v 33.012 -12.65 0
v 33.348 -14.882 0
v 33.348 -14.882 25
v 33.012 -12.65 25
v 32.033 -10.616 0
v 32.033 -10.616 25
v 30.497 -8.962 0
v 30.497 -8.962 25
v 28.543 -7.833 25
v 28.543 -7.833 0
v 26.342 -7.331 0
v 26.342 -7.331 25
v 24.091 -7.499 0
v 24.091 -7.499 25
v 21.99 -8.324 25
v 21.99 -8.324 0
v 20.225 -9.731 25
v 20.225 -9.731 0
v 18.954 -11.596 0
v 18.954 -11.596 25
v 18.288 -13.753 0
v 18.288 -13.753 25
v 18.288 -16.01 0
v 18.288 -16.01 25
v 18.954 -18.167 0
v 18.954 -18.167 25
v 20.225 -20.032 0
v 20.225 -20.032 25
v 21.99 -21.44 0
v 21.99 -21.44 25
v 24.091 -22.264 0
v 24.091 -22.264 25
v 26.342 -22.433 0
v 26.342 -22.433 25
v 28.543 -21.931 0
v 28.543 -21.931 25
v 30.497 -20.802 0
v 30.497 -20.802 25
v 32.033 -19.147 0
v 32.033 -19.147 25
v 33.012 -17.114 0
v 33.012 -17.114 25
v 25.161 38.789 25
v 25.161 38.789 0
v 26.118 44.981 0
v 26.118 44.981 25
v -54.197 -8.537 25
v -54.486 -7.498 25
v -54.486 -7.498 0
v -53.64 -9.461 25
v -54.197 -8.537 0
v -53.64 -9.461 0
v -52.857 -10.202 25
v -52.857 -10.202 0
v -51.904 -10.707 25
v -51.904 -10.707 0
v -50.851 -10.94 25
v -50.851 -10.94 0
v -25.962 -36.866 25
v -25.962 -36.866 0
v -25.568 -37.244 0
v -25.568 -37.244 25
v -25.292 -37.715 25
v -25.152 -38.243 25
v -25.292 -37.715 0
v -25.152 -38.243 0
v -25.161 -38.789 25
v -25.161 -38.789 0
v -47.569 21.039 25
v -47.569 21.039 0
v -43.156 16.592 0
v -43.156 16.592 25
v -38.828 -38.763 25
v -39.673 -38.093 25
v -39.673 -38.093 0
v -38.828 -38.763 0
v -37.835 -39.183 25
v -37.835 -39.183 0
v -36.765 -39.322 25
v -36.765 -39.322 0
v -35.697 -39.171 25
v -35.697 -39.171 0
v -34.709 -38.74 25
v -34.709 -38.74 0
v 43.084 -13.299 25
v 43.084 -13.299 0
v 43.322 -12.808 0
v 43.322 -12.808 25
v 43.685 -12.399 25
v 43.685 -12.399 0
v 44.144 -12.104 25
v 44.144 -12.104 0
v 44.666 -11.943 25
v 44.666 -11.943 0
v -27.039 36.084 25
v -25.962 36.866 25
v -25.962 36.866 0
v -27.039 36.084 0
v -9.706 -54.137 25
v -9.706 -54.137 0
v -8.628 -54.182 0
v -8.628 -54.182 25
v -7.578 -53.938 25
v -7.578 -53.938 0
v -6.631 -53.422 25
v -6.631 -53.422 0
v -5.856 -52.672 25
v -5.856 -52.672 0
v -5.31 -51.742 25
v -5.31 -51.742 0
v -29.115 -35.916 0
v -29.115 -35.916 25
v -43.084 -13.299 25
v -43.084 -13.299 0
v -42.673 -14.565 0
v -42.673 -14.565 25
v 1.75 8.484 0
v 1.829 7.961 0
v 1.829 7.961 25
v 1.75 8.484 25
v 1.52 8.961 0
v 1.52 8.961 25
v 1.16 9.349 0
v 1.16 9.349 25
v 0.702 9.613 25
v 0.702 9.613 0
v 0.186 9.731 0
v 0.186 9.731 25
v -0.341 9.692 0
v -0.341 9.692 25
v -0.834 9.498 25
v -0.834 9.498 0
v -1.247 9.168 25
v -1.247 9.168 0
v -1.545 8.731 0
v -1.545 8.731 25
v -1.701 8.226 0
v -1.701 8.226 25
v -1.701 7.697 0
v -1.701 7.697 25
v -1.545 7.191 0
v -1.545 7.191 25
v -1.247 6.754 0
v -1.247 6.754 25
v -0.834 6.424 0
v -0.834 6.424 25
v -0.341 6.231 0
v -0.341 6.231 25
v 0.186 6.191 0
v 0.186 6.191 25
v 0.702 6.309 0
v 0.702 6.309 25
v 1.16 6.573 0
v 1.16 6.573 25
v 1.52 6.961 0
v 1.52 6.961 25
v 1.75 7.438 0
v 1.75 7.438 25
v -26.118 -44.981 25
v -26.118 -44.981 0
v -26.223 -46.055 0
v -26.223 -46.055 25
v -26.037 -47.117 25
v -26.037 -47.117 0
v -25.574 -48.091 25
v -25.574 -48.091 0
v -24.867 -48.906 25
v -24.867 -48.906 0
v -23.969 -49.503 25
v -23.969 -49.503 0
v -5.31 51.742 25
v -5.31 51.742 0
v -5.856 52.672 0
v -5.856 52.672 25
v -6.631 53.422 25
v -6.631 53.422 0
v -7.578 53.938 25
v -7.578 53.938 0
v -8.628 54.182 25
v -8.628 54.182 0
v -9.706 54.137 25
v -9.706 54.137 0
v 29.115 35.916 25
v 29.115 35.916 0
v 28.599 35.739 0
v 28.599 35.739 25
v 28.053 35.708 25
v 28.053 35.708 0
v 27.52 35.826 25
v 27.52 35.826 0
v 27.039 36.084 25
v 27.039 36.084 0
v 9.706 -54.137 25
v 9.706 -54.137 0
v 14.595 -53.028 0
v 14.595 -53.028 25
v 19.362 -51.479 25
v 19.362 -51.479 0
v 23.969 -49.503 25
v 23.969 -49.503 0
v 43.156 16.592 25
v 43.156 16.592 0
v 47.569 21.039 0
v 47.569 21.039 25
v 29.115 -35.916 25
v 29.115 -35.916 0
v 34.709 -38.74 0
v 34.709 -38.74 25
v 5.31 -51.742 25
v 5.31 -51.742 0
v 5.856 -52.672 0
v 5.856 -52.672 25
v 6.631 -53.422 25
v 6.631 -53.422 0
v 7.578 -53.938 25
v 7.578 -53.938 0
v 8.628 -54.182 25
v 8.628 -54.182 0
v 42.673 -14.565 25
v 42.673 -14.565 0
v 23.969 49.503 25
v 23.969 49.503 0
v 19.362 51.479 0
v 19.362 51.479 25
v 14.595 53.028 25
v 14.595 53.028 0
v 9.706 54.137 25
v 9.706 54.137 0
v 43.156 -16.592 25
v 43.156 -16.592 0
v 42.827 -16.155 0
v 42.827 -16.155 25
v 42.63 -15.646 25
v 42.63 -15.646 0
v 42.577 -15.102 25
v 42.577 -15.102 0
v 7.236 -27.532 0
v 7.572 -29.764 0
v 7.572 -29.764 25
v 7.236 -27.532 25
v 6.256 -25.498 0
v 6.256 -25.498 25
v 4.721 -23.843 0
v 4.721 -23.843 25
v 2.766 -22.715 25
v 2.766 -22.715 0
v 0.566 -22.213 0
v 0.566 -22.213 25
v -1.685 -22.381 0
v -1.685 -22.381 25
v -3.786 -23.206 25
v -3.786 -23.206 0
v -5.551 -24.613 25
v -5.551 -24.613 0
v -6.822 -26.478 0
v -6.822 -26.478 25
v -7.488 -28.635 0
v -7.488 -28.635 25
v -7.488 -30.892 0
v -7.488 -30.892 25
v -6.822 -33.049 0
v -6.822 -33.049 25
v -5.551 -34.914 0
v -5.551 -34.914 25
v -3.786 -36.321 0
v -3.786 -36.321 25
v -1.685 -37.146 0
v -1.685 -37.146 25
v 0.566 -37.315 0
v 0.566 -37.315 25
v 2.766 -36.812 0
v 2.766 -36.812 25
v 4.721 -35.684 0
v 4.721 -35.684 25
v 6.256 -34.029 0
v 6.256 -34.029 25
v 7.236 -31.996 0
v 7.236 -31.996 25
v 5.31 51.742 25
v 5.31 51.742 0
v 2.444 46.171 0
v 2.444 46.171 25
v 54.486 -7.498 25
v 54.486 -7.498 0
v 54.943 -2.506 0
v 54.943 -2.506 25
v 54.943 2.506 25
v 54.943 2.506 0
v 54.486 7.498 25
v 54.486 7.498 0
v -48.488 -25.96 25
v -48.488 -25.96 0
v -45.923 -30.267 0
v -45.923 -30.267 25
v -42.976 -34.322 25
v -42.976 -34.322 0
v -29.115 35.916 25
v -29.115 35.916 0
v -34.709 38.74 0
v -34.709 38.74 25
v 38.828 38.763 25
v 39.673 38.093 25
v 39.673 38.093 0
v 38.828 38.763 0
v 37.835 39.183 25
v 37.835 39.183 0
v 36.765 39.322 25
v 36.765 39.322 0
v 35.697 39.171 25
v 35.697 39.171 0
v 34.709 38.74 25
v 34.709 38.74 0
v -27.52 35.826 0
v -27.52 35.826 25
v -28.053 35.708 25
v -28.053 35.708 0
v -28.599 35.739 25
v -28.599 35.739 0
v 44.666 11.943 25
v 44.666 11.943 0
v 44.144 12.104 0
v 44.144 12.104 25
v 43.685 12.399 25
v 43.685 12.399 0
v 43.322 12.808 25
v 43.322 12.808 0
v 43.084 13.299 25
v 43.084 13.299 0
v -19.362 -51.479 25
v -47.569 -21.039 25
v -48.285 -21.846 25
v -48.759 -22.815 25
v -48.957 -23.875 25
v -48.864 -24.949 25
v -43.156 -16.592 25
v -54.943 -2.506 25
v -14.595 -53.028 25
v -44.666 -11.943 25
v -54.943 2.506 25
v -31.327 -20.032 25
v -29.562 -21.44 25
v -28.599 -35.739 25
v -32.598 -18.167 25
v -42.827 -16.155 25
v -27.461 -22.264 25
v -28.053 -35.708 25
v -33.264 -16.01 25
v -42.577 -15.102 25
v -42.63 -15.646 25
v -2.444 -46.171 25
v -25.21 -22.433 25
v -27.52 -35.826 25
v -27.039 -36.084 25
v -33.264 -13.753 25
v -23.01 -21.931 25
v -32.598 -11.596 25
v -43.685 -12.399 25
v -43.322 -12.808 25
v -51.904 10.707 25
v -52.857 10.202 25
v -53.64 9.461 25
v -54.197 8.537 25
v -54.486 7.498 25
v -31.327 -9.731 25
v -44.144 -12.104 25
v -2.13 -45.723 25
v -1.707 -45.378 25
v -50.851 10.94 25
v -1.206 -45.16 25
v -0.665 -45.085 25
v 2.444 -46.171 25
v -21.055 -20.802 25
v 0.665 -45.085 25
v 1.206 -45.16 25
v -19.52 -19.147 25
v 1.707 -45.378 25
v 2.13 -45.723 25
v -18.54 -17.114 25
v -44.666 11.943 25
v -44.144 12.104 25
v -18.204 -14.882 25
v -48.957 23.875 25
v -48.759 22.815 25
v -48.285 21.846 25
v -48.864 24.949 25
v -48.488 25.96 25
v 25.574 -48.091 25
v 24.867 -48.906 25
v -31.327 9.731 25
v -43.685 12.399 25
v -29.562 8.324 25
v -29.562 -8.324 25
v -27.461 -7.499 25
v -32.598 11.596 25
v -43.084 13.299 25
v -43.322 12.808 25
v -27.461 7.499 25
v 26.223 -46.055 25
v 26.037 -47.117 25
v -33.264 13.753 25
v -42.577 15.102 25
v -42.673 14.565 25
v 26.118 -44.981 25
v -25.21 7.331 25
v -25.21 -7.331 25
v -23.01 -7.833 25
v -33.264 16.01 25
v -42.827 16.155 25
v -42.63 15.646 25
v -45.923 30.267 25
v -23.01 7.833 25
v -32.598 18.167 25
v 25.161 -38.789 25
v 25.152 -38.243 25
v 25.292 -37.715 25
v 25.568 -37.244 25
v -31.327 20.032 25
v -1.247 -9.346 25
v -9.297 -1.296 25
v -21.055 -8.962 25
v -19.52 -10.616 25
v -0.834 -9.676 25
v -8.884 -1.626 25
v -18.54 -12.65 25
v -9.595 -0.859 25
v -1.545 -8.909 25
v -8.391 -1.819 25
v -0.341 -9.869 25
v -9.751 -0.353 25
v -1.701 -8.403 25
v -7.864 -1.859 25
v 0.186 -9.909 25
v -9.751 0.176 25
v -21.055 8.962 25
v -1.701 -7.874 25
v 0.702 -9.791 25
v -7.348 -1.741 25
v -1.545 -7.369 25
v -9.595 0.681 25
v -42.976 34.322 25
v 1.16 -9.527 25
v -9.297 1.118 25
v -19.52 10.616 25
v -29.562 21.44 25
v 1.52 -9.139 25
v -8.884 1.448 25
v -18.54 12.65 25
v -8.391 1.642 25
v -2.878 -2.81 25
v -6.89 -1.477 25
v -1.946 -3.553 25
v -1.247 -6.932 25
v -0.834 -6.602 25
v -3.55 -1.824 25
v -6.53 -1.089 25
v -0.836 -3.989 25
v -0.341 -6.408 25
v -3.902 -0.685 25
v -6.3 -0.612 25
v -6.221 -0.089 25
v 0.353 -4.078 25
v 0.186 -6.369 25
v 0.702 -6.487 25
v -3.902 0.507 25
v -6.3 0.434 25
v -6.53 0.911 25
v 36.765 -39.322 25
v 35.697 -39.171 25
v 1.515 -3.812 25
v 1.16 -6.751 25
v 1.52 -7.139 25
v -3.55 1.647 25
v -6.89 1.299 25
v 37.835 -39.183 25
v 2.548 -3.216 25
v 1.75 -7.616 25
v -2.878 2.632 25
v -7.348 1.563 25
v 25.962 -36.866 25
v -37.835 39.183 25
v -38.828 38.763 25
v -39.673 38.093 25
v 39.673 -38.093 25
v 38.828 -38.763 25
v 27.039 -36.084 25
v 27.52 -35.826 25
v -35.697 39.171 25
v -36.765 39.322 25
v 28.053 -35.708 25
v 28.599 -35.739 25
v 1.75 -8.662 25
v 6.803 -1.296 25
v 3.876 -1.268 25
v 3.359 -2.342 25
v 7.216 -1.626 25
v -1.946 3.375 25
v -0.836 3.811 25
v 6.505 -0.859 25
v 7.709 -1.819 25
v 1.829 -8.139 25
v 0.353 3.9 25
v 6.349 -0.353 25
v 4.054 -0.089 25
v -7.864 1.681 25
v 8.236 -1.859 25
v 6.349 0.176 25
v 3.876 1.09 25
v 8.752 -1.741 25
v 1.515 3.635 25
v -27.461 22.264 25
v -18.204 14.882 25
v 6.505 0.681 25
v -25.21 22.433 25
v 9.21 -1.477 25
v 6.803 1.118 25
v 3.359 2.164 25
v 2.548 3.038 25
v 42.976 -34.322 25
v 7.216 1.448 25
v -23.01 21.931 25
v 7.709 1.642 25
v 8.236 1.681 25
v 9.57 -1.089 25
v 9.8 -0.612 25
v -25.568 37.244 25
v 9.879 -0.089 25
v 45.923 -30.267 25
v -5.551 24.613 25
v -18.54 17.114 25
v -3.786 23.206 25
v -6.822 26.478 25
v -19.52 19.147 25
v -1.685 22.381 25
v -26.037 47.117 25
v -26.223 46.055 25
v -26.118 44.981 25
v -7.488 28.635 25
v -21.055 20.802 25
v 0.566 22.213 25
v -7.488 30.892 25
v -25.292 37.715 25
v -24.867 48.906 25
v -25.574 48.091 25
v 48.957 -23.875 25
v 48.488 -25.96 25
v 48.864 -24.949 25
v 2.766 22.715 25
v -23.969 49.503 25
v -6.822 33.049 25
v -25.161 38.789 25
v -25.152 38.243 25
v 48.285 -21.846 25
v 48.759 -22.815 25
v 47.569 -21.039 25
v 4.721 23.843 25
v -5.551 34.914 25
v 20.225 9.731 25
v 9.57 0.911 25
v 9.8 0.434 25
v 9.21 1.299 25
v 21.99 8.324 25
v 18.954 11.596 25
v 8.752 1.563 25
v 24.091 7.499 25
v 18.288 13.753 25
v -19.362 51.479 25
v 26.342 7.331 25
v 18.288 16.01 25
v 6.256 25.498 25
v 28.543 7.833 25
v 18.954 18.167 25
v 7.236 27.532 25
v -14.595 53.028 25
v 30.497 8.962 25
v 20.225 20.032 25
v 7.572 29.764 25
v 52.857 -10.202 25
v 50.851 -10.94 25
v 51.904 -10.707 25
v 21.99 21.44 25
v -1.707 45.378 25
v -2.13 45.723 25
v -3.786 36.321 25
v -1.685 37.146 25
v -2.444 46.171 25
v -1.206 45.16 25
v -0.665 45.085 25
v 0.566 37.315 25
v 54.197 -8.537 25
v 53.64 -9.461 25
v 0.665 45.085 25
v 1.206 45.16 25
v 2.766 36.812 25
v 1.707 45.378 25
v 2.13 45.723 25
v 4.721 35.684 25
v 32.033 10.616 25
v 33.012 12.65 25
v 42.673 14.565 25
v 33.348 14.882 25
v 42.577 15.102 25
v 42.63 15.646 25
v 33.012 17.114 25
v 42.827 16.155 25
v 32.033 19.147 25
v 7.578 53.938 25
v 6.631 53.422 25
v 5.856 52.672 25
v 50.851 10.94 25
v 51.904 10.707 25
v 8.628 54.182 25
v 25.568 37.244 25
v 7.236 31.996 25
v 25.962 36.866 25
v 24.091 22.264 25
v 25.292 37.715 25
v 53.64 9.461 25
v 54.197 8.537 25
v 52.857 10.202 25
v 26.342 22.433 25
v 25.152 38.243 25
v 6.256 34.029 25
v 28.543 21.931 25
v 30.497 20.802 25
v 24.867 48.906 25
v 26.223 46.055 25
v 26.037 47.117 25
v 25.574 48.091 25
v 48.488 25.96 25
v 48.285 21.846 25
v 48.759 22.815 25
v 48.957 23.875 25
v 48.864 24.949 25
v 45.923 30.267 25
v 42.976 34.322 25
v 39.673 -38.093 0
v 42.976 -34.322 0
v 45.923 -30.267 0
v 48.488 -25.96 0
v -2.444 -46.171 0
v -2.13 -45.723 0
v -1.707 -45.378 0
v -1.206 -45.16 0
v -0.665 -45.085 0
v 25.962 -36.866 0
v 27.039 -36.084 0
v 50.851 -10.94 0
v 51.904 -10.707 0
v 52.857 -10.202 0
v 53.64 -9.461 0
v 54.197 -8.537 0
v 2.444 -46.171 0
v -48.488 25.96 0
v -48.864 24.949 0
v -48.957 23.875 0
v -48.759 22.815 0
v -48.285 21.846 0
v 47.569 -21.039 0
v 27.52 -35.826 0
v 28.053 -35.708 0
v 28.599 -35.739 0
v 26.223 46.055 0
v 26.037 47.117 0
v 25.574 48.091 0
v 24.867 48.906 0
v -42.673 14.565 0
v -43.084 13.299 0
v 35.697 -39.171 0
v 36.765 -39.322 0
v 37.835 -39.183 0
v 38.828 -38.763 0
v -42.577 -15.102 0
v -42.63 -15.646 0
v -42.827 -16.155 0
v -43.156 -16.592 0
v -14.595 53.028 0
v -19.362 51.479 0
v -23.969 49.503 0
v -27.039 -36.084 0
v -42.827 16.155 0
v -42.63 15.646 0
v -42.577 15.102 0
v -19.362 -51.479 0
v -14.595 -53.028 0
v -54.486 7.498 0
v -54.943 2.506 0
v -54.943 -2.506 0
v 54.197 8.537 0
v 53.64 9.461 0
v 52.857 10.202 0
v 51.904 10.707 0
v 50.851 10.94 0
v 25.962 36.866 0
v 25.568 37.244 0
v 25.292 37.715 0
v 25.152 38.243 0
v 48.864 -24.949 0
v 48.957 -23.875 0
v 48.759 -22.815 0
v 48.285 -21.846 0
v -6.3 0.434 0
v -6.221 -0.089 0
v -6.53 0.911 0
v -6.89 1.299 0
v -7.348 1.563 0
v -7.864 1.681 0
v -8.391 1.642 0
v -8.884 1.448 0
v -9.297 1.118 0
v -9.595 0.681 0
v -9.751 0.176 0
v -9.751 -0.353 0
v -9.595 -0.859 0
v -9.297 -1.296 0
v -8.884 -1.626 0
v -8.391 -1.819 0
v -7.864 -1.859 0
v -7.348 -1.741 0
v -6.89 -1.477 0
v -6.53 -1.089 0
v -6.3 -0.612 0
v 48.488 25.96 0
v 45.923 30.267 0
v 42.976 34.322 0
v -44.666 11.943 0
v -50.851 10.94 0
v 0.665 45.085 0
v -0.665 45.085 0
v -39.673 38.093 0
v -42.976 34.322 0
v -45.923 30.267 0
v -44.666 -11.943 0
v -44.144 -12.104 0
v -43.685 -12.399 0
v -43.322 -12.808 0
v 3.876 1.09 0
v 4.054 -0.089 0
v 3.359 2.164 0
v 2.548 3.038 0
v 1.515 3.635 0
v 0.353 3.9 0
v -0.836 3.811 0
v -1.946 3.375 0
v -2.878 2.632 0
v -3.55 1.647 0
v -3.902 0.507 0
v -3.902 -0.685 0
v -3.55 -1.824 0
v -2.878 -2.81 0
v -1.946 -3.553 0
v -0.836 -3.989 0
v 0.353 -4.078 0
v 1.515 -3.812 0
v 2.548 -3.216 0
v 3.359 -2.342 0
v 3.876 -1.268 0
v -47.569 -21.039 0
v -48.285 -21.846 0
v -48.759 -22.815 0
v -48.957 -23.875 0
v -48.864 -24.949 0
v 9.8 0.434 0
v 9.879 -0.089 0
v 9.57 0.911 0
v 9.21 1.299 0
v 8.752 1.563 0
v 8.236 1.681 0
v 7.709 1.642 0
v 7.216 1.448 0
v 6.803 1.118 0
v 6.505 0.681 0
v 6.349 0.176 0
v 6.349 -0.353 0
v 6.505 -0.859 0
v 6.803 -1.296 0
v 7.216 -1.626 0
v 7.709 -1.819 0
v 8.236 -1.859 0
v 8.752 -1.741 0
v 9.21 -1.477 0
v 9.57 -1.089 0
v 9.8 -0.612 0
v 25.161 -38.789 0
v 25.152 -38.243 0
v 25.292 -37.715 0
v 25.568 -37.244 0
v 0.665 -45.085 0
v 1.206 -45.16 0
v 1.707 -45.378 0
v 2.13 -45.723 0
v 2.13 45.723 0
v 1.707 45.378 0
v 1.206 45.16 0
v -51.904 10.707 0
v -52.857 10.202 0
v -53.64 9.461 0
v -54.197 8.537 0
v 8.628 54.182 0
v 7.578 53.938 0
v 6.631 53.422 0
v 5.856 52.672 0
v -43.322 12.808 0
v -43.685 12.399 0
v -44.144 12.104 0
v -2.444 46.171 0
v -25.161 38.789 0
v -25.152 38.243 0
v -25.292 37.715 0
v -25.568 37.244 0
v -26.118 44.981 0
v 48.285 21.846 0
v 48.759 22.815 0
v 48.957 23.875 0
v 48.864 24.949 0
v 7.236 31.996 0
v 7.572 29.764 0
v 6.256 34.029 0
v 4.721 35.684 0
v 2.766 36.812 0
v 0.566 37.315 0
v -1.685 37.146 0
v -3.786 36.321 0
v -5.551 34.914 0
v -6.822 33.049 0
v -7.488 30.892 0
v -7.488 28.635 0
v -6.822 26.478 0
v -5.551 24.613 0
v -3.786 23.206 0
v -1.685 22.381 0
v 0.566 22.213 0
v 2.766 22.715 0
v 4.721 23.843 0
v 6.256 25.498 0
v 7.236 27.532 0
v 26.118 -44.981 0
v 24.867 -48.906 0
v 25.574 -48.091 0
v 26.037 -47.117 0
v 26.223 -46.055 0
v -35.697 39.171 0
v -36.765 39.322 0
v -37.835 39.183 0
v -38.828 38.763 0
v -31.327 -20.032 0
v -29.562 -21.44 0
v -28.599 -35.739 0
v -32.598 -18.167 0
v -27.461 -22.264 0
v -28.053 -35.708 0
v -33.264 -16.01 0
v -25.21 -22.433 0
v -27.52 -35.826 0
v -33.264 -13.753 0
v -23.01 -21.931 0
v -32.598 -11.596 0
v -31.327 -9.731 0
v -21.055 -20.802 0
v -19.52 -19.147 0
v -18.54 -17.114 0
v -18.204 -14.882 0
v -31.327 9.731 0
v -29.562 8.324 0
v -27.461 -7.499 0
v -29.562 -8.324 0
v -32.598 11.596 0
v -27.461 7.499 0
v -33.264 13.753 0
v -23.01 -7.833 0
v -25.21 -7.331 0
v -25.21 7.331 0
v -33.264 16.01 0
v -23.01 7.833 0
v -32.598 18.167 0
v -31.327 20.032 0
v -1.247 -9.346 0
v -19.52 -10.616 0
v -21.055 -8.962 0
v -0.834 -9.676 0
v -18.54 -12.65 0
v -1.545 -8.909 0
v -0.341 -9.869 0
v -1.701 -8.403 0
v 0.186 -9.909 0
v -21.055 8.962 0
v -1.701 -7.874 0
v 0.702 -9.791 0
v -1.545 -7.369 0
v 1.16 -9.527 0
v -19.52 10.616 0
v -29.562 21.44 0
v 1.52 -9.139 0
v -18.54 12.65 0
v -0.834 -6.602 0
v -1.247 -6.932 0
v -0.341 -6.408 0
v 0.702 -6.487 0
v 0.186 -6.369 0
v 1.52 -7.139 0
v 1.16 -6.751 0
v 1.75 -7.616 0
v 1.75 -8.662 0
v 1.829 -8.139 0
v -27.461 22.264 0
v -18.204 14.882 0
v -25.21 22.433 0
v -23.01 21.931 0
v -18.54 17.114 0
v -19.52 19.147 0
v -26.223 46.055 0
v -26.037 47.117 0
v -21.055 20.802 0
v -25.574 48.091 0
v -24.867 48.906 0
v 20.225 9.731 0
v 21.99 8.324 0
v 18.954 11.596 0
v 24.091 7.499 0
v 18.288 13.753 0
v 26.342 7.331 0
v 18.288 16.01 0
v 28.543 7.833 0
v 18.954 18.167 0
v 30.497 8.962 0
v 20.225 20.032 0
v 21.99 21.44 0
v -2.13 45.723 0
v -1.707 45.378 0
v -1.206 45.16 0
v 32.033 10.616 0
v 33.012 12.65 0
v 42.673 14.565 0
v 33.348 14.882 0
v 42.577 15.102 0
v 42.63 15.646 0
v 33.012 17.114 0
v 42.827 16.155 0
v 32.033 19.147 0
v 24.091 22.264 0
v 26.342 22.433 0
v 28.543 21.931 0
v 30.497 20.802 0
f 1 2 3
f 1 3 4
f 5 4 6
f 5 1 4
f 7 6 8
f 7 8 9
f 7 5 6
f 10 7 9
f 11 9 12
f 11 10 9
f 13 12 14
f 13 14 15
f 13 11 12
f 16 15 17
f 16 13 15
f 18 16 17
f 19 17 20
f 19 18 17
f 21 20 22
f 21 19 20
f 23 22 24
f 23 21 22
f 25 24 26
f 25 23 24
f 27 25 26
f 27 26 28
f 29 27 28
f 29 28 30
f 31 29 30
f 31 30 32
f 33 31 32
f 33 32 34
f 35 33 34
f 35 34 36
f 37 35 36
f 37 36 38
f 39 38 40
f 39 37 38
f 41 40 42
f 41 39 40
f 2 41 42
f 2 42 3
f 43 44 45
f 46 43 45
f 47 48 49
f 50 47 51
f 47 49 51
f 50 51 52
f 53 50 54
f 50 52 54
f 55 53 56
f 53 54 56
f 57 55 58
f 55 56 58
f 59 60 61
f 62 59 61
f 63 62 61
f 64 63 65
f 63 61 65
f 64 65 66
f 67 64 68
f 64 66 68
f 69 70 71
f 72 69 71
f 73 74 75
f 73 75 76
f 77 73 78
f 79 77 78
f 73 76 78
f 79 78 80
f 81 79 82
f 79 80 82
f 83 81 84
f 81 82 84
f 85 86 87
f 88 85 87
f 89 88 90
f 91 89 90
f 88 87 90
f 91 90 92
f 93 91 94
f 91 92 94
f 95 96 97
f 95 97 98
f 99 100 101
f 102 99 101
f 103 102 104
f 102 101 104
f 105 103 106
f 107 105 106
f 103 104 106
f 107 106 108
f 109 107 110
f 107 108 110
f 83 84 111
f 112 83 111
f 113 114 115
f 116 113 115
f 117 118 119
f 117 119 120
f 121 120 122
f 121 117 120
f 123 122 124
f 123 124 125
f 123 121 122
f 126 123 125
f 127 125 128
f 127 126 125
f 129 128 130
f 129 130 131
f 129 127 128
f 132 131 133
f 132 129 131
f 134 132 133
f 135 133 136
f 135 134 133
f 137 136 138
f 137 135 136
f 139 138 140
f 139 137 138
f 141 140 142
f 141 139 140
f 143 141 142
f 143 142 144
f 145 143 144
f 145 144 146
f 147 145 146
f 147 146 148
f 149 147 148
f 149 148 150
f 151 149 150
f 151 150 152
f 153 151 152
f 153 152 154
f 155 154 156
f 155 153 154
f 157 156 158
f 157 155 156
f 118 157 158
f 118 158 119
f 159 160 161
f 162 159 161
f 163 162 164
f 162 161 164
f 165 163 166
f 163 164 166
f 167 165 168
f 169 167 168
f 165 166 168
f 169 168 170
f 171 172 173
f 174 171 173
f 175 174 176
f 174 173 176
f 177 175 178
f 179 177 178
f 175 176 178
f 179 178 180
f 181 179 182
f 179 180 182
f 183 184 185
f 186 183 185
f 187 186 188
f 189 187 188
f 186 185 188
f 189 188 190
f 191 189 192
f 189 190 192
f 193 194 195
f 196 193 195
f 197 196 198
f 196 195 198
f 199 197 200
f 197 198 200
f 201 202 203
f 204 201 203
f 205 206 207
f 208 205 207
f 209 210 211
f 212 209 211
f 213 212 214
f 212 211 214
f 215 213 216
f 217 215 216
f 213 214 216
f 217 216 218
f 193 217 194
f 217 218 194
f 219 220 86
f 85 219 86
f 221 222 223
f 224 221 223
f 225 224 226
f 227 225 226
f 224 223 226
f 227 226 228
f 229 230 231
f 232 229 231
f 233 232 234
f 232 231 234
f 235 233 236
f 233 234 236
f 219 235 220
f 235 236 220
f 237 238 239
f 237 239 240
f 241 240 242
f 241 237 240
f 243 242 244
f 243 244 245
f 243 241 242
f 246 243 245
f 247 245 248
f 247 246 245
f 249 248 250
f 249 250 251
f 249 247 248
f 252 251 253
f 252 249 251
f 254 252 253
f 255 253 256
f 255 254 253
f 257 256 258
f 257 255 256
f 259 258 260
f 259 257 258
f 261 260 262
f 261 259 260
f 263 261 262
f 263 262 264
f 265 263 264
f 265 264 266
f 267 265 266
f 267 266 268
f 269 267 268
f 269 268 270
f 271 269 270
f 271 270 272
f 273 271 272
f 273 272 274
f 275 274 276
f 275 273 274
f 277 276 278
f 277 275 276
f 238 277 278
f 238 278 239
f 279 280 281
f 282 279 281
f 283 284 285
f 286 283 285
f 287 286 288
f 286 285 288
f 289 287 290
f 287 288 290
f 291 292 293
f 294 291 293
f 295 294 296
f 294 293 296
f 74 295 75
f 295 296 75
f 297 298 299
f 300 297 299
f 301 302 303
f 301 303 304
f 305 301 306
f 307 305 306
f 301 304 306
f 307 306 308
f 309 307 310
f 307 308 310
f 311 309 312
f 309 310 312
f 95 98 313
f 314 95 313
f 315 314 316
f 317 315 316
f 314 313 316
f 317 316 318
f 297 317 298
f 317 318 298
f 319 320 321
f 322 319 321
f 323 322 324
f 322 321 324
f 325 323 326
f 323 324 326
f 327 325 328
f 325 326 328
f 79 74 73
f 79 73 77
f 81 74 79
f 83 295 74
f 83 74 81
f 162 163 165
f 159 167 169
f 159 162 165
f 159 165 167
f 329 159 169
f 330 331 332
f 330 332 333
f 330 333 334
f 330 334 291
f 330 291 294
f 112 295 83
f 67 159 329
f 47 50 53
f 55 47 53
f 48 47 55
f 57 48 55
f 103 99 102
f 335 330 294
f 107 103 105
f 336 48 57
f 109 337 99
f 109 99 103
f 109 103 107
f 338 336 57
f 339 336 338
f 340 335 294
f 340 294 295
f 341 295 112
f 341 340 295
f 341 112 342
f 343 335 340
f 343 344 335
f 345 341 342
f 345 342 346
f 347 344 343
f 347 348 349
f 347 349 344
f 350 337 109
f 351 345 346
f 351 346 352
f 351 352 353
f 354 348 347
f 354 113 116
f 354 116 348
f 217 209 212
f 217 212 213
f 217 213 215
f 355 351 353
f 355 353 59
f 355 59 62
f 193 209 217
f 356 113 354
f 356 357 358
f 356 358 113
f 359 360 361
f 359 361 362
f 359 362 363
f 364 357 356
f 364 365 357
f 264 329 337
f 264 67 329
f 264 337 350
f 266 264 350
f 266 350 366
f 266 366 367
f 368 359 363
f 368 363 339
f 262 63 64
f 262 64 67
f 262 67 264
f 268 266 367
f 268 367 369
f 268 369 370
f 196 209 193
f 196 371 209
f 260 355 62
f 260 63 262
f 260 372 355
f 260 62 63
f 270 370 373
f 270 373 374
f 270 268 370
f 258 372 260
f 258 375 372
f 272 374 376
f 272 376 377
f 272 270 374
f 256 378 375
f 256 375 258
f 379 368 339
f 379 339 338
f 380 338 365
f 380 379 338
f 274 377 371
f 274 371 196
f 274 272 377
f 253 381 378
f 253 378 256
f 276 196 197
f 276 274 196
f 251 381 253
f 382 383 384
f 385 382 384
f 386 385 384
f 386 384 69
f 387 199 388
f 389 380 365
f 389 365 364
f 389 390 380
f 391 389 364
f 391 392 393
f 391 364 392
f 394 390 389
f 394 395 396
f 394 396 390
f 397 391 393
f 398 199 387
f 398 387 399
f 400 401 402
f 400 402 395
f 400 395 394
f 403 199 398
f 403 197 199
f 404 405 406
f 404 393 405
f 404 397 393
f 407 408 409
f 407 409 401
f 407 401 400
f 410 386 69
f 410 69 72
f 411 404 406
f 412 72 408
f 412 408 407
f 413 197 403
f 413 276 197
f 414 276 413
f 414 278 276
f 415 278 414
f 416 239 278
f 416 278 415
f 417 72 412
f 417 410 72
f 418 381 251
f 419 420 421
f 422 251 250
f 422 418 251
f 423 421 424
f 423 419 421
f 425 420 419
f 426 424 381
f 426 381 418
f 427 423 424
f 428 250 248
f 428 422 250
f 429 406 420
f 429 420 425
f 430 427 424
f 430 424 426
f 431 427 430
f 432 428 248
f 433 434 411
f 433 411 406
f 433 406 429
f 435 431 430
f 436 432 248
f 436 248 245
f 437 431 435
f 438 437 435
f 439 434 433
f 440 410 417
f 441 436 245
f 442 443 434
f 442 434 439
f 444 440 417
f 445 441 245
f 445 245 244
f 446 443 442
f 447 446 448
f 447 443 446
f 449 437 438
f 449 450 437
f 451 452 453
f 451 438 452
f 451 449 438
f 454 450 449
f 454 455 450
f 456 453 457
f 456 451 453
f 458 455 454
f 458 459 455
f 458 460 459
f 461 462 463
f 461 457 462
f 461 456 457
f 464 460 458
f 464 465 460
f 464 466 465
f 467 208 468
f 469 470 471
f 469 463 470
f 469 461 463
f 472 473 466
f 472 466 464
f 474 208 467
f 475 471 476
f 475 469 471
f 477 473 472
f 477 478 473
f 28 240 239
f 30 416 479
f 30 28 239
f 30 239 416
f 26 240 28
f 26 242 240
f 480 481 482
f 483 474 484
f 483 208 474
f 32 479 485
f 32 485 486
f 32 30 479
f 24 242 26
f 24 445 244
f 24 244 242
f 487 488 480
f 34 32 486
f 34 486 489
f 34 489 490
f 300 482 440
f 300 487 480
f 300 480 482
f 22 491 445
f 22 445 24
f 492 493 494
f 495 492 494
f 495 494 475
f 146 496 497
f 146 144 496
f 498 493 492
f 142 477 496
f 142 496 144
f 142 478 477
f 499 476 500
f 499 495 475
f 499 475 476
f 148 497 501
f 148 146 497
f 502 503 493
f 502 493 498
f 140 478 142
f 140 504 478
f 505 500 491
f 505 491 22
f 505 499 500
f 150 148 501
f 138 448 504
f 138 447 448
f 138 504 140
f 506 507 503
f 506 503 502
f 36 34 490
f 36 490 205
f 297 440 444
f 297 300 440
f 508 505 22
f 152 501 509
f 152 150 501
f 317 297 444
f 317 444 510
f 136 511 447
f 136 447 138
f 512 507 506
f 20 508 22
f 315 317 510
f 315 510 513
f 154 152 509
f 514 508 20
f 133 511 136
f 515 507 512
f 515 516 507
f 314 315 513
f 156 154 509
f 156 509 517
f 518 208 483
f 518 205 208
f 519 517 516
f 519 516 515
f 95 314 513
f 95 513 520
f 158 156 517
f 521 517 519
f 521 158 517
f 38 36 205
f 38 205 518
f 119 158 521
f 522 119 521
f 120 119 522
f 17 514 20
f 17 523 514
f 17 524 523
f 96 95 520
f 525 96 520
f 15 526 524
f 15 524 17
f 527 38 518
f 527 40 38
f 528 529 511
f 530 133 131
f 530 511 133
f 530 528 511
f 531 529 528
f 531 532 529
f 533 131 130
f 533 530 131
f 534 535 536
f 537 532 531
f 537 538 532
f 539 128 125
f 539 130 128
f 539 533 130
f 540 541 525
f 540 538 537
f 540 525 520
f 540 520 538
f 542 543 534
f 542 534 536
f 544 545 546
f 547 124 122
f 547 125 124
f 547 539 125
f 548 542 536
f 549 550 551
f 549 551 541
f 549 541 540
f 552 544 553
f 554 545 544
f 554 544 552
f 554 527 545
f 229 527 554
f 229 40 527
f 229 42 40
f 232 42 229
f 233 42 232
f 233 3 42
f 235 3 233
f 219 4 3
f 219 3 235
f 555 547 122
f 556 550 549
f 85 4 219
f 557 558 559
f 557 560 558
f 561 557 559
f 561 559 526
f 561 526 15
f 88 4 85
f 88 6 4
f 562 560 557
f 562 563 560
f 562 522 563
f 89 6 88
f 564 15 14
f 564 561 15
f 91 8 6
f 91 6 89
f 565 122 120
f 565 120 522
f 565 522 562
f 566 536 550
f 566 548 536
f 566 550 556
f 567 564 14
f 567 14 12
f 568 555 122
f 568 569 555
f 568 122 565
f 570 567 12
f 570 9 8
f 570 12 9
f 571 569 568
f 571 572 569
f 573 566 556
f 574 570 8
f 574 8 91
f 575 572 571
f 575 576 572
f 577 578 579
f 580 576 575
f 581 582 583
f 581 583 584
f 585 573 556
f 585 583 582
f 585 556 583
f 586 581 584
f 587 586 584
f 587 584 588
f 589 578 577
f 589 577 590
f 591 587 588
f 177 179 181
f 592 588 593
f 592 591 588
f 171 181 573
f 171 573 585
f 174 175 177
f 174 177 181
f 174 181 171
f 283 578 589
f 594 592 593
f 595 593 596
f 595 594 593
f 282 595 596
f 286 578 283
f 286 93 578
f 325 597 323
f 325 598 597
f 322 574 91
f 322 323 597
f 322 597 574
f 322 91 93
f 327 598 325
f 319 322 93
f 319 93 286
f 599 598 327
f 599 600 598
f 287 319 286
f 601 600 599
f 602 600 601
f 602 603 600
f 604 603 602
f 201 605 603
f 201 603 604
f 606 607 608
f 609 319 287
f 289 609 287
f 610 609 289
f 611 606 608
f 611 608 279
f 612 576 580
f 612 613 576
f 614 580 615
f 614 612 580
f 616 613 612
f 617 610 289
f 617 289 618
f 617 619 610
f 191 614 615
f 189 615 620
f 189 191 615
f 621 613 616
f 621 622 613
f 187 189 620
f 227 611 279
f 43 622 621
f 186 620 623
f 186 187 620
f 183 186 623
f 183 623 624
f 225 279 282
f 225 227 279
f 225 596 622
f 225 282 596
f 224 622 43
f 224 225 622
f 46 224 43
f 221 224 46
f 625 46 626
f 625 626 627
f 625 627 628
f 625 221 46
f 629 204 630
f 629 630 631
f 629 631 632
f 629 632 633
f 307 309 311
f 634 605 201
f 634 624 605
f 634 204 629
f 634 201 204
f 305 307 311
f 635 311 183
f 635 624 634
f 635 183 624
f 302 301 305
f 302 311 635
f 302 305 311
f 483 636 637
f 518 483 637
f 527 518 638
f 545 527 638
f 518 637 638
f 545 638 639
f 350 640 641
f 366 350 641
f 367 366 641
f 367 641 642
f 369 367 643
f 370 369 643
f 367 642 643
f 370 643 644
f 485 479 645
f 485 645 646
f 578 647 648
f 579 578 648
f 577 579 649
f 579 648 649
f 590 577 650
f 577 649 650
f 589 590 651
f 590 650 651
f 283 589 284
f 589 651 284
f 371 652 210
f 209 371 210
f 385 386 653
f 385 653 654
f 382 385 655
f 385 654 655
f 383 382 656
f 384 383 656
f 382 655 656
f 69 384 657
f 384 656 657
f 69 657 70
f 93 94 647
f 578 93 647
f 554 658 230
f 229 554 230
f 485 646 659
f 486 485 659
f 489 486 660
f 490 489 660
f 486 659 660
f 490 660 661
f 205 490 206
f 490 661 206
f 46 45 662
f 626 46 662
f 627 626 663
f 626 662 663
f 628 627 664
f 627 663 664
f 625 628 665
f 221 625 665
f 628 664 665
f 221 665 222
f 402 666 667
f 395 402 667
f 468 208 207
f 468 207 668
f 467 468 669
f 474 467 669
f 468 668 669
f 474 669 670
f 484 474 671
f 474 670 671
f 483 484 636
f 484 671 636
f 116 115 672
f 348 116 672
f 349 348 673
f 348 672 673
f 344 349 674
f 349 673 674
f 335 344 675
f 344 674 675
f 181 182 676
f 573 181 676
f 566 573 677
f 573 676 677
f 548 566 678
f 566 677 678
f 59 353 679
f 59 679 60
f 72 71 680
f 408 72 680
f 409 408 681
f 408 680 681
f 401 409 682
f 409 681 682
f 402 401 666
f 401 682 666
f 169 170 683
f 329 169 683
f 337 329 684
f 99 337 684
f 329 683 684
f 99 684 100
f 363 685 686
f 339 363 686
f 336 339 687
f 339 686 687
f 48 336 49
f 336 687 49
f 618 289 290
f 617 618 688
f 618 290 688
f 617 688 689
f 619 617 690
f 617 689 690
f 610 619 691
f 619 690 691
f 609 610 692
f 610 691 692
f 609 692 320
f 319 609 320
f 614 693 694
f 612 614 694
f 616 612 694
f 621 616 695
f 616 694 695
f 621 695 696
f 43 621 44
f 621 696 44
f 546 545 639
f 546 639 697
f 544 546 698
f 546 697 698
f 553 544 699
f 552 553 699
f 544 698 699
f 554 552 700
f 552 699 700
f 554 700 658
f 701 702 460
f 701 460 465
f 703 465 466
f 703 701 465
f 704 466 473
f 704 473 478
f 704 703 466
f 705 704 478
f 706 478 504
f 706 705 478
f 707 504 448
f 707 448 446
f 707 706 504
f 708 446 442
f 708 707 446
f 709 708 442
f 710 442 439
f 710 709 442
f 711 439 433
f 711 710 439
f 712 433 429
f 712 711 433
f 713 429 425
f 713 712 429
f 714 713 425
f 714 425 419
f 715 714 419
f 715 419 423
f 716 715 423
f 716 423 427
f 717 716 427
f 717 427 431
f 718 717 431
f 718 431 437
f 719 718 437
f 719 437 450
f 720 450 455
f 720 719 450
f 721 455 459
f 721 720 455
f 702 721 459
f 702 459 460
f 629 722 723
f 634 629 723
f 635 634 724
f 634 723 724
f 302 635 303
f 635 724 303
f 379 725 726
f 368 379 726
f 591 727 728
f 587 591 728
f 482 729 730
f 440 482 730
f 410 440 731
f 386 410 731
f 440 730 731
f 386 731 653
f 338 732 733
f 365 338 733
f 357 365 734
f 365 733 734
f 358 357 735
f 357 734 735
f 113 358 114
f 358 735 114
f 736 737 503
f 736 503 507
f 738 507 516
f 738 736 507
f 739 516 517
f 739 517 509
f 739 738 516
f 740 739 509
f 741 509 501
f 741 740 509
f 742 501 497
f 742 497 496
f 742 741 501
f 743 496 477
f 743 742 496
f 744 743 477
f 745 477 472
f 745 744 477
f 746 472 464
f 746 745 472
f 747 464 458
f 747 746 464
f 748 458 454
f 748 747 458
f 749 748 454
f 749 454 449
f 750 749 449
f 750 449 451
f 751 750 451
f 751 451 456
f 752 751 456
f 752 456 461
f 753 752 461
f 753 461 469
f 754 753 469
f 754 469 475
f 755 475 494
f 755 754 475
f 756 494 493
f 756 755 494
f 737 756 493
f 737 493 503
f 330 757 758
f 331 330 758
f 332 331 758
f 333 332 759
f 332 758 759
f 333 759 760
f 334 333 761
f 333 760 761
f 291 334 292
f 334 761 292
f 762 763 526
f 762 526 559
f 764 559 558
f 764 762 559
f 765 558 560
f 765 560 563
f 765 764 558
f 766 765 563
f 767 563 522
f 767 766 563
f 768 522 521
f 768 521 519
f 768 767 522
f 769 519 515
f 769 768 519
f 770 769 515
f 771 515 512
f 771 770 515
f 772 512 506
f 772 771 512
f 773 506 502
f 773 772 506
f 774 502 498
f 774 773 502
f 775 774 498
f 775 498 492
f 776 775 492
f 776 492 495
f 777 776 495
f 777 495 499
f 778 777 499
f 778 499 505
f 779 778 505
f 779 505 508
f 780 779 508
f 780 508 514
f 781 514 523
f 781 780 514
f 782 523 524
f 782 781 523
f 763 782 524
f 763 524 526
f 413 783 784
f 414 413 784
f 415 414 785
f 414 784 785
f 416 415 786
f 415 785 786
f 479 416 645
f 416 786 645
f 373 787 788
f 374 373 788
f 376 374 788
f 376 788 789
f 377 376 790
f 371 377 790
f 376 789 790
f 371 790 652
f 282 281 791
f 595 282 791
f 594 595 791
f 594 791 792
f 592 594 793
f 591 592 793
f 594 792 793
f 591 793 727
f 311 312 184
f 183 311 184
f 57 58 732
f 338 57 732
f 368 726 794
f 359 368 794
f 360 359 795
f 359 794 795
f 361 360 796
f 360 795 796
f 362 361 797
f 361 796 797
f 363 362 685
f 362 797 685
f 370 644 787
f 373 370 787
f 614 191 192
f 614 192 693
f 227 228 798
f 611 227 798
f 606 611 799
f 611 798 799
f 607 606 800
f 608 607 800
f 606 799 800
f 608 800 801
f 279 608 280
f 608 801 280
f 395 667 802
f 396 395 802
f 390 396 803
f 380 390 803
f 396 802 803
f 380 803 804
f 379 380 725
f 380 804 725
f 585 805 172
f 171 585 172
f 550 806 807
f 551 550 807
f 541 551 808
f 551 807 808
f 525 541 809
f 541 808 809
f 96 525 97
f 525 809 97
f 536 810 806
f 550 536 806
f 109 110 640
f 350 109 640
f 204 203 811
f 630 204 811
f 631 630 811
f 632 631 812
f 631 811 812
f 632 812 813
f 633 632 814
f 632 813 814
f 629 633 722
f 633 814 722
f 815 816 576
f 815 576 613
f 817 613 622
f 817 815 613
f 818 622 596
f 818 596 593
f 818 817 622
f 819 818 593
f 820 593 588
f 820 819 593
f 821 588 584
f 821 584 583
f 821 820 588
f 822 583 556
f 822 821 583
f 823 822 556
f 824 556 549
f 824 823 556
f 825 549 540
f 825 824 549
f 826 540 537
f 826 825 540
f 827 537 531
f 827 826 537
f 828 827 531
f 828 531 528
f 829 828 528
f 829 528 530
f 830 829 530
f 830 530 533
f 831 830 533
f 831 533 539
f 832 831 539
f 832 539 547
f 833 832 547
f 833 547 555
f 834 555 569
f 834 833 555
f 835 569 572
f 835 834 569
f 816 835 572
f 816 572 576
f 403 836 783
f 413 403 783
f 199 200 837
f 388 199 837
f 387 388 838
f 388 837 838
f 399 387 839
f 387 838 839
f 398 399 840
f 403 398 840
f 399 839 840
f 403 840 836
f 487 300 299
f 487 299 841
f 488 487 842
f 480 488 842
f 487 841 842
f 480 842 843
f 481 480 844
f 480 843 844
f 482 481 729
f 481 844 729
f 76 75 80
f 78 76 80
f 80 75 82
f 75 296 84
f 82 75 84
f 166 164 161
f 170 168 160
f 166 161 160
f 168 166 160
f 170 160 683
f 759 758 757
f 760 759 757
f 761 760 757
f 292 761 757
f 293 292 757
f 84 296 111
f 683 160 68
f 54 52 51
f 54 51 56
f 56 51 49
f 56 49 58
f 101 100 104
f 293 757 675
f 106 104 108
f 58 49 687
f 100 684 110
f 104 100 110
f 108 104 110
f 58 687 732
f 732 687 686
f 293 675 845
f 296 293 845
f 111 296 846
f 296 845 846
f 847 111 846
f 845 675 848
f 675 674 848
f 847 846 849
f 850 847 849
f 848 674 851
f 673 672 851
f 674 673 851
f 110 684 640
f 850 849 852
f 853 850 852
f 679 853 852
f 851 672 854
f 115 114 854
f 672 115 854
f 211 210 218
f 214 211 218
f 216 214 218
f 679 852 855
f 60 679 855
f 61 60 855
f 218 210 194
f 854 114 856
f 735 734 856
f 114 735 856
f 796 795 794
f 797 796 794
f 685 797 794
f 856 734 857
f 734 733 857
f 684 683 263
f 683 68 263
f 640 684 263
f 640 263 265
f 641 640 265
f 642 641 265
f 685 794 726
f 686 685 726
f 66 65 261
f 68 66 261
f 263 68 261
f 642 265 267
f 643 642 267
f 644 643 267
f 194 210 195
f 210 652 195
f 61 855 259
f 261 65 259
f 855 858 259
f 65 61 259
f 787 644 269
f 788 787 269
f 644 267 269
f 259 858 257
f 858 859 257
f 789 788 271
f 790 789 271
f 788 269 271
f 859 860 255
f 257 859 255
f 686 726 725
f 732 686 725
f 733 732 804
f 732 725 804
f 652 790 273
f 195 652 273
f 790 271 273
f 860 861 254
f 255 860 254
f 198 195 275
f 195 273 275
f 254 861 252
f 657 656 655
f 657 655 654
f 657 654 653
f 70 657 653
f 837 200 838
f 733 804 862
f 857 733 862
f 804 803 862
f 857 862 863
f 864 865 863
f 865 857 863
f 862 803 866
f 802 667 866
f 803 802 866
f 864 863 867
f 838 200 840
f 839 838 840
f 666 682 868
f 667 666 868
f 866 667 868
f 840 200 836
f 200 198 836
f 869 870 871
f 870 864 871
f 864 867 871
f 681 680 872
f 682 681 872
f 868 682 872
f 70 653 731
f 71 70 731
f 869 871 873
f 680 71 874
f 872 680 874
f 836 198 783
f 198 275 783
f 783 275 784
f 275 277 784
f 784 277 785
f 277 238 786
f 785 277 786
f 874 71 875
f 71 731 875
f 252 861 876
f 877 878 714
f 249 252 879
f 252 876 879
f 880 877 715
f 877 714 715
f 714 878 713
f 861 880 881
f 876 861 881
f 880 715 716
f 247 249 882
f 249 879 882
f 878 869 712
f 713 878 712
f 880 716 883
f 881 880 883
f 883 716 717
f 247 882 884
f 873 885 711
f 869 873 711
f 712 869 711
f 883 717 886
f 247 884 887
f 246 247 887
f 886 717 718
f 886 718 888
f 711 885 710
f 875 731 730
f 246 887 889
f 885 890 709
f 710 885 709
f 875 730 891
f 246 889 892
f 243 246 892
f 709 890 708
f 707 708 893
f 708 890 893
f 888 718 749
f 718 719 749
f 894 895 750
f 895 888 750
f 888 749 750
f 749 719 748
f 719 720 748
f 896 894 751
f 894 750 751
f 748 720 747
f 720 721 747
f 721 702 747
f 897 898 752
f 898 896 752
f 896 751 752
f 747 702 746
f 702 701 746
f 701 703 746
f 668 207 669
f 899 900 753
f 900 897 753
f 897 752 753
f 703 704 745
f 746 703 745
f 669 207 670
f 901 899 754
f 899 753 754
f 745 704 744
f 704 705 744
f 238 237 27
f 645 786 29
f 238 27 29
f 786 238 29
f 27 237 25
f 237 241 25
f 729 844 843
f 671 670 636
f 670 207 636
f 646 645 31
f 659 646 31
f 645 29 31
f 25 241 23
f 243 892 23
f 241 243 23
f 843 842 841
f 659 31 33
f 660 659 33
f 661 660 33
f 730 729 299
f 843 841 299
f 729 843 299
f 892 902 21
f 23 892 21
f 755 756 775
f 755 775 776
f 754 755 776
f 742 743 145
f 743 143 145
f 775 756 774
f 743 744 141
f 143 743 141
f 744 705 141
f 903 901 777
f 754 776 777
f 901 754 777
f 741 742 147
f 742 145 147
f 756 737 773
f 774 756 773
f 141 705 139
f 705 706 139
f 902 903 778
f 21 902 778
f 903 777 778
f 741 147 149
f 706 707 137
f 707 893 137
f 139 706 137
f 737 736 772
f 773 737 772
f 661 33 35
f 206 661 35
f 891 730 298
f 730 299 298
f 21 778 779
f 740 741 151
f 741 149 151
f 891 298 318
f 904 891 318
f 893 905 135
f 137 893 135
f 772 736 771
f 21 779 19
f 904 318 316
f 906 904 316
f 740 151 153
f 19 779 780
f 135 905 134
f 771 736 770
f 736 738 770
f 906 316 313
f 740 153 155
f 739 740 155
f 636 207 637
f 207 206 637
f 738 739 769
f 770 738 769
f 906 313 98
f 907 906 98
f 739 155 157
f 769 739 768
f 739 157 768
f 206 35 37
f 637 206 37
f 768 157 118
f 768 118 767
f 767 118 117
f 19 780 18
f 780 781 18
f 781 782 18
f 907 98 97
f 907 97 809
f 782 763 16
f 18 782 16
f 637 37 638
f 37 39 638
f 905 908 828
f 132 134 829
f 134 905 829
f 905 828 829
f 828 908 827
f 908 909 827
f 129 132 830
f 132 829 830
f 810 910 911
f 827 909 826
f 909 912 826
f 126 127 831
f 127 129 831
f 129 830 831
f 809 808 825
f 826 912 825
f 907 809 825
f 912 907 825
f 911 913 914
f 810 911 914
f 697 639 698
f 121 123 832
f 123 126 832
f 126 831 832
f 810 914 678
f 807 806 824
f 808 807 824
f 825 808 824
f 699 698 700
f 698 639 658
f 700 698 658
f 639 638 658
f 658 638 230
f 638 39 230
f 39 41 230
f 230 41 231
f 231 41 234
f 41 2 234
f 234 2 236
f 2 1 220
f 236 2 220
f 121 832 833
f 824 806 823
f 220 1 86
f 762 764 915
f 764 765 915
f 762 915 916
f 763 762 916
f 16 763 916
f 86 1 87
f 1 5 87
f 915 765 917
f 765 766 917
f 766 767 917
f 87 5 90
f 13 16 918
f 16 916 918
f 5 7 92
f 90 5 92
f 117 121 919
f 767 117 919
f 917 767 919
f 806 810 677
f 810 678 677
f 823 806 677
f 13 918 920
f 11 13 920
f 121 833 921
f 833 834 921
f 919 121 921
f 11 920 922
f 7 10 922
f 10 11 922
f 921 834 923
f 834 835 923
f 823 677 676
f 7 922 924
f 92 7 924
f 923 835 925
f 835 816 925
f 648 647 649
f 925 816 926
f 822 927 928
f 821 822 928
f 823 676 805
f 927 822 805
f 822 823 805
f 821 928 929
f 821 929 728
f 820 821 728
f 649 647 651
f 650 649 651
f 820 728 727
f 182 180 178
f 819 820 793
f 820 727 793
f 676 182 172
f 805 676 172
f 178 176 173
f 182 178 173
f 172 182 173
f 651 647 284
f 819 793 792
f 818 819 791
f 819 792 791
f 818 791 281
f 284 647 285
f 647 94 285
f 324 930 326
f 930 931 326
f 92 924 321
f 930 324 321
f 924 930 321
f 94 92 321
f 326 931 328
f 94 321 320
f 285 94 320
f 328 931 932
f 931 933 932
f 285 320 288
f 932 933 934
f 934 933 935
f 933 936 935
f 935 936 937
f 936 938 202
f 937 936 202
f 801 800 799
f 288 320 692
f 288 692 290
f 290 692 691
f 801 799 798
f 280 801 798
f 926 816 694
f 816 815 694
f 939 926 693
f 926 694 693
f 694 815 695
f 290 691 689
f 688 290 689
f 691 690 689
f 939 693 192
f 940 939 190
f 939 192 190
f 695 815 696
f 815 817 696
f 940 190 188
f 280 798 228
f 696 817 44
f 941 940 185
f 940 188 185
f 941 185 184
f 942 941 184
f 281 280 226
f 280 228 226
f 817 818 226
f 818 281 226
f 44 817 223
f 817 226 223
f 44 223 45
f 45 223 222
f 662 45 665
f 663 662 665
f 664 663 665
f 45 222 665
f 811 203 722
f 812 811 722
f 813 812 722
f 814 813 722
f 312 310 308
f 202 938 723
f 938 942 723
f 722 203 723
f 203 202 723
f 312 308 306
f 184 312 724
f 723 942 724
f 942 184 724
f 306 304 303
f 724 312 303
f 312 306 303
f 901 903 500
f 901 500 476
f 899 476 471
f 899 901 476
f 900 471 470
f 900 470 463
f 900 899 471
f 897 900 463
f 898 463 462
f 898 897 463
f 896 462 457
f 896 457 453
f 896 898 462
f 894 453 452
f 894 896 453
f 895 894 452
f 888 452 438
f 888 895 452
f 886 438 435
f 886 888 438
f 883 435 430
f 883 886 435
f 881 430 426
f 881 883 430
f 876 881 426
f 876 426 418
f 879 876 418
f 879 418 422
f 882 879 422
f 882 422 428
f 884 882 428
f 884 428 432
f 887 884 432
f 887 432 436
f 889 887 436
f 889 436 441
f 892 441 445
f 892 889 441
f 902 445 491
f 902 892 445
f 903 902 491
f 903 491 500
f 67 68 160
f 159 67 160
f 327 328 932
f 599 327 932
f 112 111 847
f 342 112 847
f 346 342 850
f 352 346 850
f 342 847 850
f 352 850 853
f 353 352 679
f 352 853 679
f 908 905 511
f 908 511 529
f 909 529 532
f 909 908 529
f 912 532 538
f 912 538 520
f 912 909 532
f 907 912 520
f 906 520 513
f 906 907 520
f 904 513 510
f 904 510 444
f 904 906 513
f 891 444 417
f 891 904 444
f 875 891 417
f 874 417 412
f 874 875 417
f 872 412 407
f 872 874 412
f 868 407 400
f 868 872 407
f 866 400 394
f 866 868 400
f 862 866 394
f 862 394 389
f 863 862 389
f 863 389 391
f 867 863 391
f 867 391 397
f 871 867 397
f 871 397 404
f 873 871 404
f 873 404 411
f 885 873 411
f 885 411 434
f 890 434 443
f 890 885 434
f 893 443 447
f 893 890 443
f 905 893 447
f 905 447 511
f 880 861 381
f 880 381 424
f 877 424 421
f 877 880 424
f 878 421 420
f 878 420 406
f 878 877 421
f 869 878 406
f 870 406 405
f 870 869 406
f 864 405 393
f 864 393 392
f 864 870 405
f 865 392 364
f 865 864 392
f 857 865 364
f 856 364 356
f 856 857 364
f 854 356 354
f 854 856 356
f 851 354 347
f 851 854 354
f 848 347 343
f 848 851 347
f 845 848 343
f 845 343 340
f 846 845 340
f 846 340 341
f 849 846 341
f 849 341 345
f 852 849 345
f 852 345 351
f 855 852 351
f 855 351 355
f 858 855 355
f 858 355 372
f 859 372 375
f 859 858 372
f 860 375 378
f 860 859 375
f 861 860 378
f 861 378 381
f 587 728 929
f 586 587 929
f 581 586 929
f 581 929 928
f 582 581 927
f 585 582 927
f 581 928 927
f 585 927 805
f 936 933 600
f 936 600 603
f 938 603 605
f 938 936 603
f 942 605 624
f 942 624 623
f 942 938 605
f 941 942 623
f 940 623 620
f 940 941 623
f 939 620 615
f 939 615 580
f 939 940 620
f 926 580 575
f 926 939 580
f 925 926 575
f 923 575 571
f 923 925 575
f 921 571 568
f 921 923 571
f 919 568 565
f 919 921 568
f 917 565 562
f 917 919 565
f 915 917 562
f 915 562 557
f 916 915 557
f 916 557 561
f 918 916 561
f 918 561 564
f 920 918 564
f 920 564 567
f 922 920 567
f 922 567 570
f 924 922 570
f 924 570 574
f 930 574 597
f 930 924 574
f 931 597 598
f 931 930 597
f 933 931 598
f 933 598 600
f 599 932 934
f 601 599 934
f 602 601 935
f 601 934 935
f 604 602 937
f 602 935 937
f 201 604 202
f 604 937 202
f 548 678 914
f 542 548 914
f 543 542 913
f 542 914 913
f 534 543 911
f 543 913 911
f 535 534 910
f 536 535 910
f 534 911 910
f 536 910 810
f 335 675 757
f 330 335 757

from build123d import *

# Parameters (mm, degrees)
F0_R     = 7.572247
F0_R_2   = 1.775
F0_R_3   = 4
F1_DEPTH = 25


with BuildPart() as f1:
    # F0 (on Top) → F1 (new body)
    with BuildSketch(Plane.XY):
        with BuildLine():
            ThreePointArc((-5.309504, 51.742404), (-7.086811, 53.712393), (-9.705882, 54.136825))
            ThreePointArc((-9.705882, 54.136825), (-16.995935, 52.308108), (-23.968604, 49.502586))
            ThreePointArc((-23.968604, 49.502586), (-25.838002, 47.619762), (-26.117943, 44.981332))
            Line((-26.117943, 44.981332), (-25.161306, 38.789124))
            ThreePointArc((-25.161306, 38.789124), (-25.291556, 37.714888), (-25.962287, 36.865731))
            Line((-25.962287, 36.865731), (-27.038606, 36.083739))
            ThreePointArc((-27.038606, 36.083739), (-28.053469, 35.708241), (-29.115378, 35.916322))
            Line((-29.115378, 35.916322), (-34.708901, 38.739636))
            ThreePointArc((-34.708901, 38.739636), (-37.304703, 39.288716), (-39.673051, 38.092637))
            ThreePointArc((-39.673051, 38.092637), (-44.495935, 32.328189), (-48.487898, 25.960042))
            ThreePointArc((-48.487898, 25.960042), (-48.893577, 23.338), (-47.569223, 21.03892))
            Line((-47.569223, 21.03892), (-43.155599, 16.591616))
            ThreePointArc((-43.155599, 16.591616), (-42.629554, 15.645982), (-42.673064, 14.564754))
            Line((-42.673064, 14.564754), (-43.084182, 13.299464))
            ThreePointArc((-43.084182, 13.299464), (-43.684511, 12.399158), (-44.66592, 11.943325))
            Line((-44.66592, 11.943325), (-50.850677, 10.939644))
            ThreePointArc((-50.850677, 10.939644), (-53.273467, 9.858085), (-54.486463, 7.498356))
            ThreePointArc((-54.486463, 7.498356), (-55, 0), (-54.486463, -7.498356))
            ThreePointArc((-54.486463, -7.498356), (-53.273467, -9.858085), (-50.850677, -10.939644))
            Line((-50.850677, -10.939644), (-44.66592, -11.943325))
            ThreePointArc((-44.66592, -11.943325), (-43.684511, -12.399158), (-43.084182, -13.299464))
            Line((-43.084182, -13.299464), (-42.673064, -14.564754))
            ThreePointArc((-42.673064, -14.564754), (-42.629554, -15.645982), (-43.155599, -16.591616))
            Line((-43.155599, -16.591616), (-47.569223, -21.03892))
            ThreePointArc((-47.569223, -21.03892), (-48.893577, -23.338), (-48.487898, -25.960042))
            ThreePointArc((-48.487898, -25.960042), (-44.495935, -32.328189), (-39.673051, -38.092637))
            ThreePointArc((-39.673051, -38.092637), (-37.304703, -39.288716), (-34.708901, -38.739636))
            Line((-34.708901, -38.739636), (-29.115378, -35.916322))
            ThreePointArc((-29.115378, -35.916322), (-28.053469, -35.708241), (-27.038606, -36.083739))
            Line((-27.038606, -36.083739), (-25.962287, -36.865731))
            ThreePointArc((-25.962287, -36.865731), (-25.291556, -37.714888), (-25.161306, -38.789124))
            Line((-25.161306, -38.789124), (-26.117943, -44.981332))
            ThreePointArc((-26.117943, -44.981332), (-25.838002, -47.619762), (-23.968604, -49.502586))
            ThreePointArc((-23.968604, -49.502586), (-16.995935, -52.308108), (-9.705882, -54.136825))
            ThreePointArc((-9.705882, -54.136825), (-7.086811, -53.712393), (-5.309504, -51.742404))
            Line((-5.309504, -51.742404), (-2.443751, -46.170505))
            ThreePointArc((-2.443751, -46.170505), (-1.706956, -45.377989), (-0.665202, -45.085252))
            Line((-0.665202, -45.085252), (0.665202, -45.085252))
            ThreePointArc((0.665202, -45.085252), (1.706956, -45.377989), (2.443751, -46.170505))
            Line((2.443751, -46.170505), (5.309504, -51.742404))
            ThreePointArc((5.309504, -51.742404), (7.086811, -53.712393), (9.705882, -54.136825))
            ThreePointArc((9.705882, -54.136825), (16.995935, -52.308108), (23.968604, -49.502586))
            ThreePointArc((23.968604, -49.502586), (25.838002, -47.619762), (26.117943, -44.981332))
            Line((26.117943, -44.981332), (25.161306, -38.789124))
            ThreePointArc((25.161306, -38.789124), (25.291556, -37.714888), (25.962287, -36.865731))
            Line((25.962287, -36.865731), (27.038606, -36.083739))
            ThreePointArc((27.038606, -36.083739), (28.053469, -35.708241), (29.115378, -35.916322))
            Line((29.115378, -35.916322), (34.708901, -38.739636))
            ThreePointArc((34.708901, -38.739636), (37.304703, -39.288716), (39.673051, -38.092637))
            ThreePointArc((39.673051, -38.092637), (44.495935, -32.328189), (48.487898, -25.960042))
            ThreePointArc((48.487898, -25.960042), (48.893577, -23.338), (47.569223, -21.03892))
            Line((47.569223, -21.03892), (43.155599, -16.591616))
            ThreePointArc((43.155599, -16.591616), (42.629554, -15.645982), (42.673064, -14.564754))
            Line((42.673064, -14.564754), (43.084182, -13.299464))
            ThreePointArc((43.084182, -13.299464), (43.684511, -12.399158), (44.66592, -11.943325))
            Line((44.66592, -11.943325), (50.850677, -10.939644))
            ThreePointArc((50.850677, -10.939644), (53.273467, -9.858085), (54.486463, -7.498356))
            ThreePointArc((54.486463, -7.498356), (55, 0), (54.486463, 7.498356))
            ThreePointArc((54.486463, 7.498356), (53.273467, 9.858085), (50.850677, 10.939644))
            Line((50.850677, 10.939644), (44.66592, 11.943325))
            ThreePointArc((44.66592, 11.943325), (43.684511, 12.399158), (43.084182, 13.299464))
            Line((43.084182, 13.299464), (42.673064, 14.564754))
            ThreePointArc((42.673064, 14.564754), (42.629554, 15.645982), (43.155599, 16.591616))
            Line((43.155599, 16.591616), (47.569223, 21.03892))
            ThreePointArc((47.569223, 21.03892), (48.893577, 23.338), (48.487898, 25.960042))
            ThreePointArc((48.487898, 25.960042), (44.495935, 32.328189), (39.673051, 38.092637))
            ThreePointArc((39.673051, 38.092637), (37.304703, 39.288716), (34.708901, 38.739636))
            Line((34.708901, 38.739636), (29.115378, 35.916322))
            ThreePointArc((29.115378, 35.916322), (28.053469, 35.708241), (27.038606, 36.083739))
            Line((27.038606, 36.083739), (25.962287, 36.865731))
            ThreePointArc((25.962287, 36.865731), (25.291556, 37.714888), (25.161306, 38.789124))
            Line((25.161306, 38.789124), (26.117943, 44.981332))
            ThreePointArc((26.117943, 44.981332), (25.838002, 47.619762), (23.968604, 49.502586))
            ThreePointArc((23.968604, 49.502586), (16.995935, 52.308108), (9.705882, 54.136825))
            ThreePointArc((9.705882, 54.136825), (7.086811, 53.712393), (5.309504, 51.742404))
            Line((5.309504, 51.742404), (2.443751, 46.170505))
            ThreePointArc((2.443751, 46.170505), (1.706956, 45.377989), (0.665202, 45.085252))
            Line((0.665202, 45.085252), (-0.665202, 45.085252))
            ThreePointArc((-0.665202, 45.085252), (-1.706956, 45.377989), (-2.443751, 46.170505))
            Line((-2.443751, 46.170505), (-5.309504, 51.742404))
        make_face()
        with Locations((-25.776053, -14.881811)):
            Circle(F0_R, mode=Mode.SUBTRACT)
        with Locations((-7.996251, -0.088927)):
            Circle(F0_R_2, mode=Mode.SUBTRACT)
        with Locations((0, -29.763622)):
            Circle(F0_R, mode=Mode.SUBTRACT)
        with Locations((25.776053, -14.881811)):
            Circle(F0_R, mode=Mode.SUBTRACT)
        with Locations((0.053749, -8.138927)):
            Circle(F0_R_2, mode=Mode.SUBTRACT)
        with Locations((0.053749, -0.088927)):
            Circle(F0_R_3, mode=Mode.SUBTRACT)
        with Locations((8.103749, -0.088927)):
            Circle(F0_R_2, mode=Mode.SUBTRACT)
        with Locations((-25.776053, 14.881811)):
            Circle(F0_R, mode=Mode.SUBTRACT)
        with Locations((0.053749, 7.961073)):
            Circle(F0_R_2, mode=Mode.SUBTRACT)
        with Locations((25.776053, 14.881811)):
            Circle(F0_R, mode=Mode.SUBTRACT)
        with Locations((0, 29.763622)):
            Circle(F0_R, mode=Mode.SUBTRACT)
    extrude(amount=F1_DEPTH)


solid = f1.part
